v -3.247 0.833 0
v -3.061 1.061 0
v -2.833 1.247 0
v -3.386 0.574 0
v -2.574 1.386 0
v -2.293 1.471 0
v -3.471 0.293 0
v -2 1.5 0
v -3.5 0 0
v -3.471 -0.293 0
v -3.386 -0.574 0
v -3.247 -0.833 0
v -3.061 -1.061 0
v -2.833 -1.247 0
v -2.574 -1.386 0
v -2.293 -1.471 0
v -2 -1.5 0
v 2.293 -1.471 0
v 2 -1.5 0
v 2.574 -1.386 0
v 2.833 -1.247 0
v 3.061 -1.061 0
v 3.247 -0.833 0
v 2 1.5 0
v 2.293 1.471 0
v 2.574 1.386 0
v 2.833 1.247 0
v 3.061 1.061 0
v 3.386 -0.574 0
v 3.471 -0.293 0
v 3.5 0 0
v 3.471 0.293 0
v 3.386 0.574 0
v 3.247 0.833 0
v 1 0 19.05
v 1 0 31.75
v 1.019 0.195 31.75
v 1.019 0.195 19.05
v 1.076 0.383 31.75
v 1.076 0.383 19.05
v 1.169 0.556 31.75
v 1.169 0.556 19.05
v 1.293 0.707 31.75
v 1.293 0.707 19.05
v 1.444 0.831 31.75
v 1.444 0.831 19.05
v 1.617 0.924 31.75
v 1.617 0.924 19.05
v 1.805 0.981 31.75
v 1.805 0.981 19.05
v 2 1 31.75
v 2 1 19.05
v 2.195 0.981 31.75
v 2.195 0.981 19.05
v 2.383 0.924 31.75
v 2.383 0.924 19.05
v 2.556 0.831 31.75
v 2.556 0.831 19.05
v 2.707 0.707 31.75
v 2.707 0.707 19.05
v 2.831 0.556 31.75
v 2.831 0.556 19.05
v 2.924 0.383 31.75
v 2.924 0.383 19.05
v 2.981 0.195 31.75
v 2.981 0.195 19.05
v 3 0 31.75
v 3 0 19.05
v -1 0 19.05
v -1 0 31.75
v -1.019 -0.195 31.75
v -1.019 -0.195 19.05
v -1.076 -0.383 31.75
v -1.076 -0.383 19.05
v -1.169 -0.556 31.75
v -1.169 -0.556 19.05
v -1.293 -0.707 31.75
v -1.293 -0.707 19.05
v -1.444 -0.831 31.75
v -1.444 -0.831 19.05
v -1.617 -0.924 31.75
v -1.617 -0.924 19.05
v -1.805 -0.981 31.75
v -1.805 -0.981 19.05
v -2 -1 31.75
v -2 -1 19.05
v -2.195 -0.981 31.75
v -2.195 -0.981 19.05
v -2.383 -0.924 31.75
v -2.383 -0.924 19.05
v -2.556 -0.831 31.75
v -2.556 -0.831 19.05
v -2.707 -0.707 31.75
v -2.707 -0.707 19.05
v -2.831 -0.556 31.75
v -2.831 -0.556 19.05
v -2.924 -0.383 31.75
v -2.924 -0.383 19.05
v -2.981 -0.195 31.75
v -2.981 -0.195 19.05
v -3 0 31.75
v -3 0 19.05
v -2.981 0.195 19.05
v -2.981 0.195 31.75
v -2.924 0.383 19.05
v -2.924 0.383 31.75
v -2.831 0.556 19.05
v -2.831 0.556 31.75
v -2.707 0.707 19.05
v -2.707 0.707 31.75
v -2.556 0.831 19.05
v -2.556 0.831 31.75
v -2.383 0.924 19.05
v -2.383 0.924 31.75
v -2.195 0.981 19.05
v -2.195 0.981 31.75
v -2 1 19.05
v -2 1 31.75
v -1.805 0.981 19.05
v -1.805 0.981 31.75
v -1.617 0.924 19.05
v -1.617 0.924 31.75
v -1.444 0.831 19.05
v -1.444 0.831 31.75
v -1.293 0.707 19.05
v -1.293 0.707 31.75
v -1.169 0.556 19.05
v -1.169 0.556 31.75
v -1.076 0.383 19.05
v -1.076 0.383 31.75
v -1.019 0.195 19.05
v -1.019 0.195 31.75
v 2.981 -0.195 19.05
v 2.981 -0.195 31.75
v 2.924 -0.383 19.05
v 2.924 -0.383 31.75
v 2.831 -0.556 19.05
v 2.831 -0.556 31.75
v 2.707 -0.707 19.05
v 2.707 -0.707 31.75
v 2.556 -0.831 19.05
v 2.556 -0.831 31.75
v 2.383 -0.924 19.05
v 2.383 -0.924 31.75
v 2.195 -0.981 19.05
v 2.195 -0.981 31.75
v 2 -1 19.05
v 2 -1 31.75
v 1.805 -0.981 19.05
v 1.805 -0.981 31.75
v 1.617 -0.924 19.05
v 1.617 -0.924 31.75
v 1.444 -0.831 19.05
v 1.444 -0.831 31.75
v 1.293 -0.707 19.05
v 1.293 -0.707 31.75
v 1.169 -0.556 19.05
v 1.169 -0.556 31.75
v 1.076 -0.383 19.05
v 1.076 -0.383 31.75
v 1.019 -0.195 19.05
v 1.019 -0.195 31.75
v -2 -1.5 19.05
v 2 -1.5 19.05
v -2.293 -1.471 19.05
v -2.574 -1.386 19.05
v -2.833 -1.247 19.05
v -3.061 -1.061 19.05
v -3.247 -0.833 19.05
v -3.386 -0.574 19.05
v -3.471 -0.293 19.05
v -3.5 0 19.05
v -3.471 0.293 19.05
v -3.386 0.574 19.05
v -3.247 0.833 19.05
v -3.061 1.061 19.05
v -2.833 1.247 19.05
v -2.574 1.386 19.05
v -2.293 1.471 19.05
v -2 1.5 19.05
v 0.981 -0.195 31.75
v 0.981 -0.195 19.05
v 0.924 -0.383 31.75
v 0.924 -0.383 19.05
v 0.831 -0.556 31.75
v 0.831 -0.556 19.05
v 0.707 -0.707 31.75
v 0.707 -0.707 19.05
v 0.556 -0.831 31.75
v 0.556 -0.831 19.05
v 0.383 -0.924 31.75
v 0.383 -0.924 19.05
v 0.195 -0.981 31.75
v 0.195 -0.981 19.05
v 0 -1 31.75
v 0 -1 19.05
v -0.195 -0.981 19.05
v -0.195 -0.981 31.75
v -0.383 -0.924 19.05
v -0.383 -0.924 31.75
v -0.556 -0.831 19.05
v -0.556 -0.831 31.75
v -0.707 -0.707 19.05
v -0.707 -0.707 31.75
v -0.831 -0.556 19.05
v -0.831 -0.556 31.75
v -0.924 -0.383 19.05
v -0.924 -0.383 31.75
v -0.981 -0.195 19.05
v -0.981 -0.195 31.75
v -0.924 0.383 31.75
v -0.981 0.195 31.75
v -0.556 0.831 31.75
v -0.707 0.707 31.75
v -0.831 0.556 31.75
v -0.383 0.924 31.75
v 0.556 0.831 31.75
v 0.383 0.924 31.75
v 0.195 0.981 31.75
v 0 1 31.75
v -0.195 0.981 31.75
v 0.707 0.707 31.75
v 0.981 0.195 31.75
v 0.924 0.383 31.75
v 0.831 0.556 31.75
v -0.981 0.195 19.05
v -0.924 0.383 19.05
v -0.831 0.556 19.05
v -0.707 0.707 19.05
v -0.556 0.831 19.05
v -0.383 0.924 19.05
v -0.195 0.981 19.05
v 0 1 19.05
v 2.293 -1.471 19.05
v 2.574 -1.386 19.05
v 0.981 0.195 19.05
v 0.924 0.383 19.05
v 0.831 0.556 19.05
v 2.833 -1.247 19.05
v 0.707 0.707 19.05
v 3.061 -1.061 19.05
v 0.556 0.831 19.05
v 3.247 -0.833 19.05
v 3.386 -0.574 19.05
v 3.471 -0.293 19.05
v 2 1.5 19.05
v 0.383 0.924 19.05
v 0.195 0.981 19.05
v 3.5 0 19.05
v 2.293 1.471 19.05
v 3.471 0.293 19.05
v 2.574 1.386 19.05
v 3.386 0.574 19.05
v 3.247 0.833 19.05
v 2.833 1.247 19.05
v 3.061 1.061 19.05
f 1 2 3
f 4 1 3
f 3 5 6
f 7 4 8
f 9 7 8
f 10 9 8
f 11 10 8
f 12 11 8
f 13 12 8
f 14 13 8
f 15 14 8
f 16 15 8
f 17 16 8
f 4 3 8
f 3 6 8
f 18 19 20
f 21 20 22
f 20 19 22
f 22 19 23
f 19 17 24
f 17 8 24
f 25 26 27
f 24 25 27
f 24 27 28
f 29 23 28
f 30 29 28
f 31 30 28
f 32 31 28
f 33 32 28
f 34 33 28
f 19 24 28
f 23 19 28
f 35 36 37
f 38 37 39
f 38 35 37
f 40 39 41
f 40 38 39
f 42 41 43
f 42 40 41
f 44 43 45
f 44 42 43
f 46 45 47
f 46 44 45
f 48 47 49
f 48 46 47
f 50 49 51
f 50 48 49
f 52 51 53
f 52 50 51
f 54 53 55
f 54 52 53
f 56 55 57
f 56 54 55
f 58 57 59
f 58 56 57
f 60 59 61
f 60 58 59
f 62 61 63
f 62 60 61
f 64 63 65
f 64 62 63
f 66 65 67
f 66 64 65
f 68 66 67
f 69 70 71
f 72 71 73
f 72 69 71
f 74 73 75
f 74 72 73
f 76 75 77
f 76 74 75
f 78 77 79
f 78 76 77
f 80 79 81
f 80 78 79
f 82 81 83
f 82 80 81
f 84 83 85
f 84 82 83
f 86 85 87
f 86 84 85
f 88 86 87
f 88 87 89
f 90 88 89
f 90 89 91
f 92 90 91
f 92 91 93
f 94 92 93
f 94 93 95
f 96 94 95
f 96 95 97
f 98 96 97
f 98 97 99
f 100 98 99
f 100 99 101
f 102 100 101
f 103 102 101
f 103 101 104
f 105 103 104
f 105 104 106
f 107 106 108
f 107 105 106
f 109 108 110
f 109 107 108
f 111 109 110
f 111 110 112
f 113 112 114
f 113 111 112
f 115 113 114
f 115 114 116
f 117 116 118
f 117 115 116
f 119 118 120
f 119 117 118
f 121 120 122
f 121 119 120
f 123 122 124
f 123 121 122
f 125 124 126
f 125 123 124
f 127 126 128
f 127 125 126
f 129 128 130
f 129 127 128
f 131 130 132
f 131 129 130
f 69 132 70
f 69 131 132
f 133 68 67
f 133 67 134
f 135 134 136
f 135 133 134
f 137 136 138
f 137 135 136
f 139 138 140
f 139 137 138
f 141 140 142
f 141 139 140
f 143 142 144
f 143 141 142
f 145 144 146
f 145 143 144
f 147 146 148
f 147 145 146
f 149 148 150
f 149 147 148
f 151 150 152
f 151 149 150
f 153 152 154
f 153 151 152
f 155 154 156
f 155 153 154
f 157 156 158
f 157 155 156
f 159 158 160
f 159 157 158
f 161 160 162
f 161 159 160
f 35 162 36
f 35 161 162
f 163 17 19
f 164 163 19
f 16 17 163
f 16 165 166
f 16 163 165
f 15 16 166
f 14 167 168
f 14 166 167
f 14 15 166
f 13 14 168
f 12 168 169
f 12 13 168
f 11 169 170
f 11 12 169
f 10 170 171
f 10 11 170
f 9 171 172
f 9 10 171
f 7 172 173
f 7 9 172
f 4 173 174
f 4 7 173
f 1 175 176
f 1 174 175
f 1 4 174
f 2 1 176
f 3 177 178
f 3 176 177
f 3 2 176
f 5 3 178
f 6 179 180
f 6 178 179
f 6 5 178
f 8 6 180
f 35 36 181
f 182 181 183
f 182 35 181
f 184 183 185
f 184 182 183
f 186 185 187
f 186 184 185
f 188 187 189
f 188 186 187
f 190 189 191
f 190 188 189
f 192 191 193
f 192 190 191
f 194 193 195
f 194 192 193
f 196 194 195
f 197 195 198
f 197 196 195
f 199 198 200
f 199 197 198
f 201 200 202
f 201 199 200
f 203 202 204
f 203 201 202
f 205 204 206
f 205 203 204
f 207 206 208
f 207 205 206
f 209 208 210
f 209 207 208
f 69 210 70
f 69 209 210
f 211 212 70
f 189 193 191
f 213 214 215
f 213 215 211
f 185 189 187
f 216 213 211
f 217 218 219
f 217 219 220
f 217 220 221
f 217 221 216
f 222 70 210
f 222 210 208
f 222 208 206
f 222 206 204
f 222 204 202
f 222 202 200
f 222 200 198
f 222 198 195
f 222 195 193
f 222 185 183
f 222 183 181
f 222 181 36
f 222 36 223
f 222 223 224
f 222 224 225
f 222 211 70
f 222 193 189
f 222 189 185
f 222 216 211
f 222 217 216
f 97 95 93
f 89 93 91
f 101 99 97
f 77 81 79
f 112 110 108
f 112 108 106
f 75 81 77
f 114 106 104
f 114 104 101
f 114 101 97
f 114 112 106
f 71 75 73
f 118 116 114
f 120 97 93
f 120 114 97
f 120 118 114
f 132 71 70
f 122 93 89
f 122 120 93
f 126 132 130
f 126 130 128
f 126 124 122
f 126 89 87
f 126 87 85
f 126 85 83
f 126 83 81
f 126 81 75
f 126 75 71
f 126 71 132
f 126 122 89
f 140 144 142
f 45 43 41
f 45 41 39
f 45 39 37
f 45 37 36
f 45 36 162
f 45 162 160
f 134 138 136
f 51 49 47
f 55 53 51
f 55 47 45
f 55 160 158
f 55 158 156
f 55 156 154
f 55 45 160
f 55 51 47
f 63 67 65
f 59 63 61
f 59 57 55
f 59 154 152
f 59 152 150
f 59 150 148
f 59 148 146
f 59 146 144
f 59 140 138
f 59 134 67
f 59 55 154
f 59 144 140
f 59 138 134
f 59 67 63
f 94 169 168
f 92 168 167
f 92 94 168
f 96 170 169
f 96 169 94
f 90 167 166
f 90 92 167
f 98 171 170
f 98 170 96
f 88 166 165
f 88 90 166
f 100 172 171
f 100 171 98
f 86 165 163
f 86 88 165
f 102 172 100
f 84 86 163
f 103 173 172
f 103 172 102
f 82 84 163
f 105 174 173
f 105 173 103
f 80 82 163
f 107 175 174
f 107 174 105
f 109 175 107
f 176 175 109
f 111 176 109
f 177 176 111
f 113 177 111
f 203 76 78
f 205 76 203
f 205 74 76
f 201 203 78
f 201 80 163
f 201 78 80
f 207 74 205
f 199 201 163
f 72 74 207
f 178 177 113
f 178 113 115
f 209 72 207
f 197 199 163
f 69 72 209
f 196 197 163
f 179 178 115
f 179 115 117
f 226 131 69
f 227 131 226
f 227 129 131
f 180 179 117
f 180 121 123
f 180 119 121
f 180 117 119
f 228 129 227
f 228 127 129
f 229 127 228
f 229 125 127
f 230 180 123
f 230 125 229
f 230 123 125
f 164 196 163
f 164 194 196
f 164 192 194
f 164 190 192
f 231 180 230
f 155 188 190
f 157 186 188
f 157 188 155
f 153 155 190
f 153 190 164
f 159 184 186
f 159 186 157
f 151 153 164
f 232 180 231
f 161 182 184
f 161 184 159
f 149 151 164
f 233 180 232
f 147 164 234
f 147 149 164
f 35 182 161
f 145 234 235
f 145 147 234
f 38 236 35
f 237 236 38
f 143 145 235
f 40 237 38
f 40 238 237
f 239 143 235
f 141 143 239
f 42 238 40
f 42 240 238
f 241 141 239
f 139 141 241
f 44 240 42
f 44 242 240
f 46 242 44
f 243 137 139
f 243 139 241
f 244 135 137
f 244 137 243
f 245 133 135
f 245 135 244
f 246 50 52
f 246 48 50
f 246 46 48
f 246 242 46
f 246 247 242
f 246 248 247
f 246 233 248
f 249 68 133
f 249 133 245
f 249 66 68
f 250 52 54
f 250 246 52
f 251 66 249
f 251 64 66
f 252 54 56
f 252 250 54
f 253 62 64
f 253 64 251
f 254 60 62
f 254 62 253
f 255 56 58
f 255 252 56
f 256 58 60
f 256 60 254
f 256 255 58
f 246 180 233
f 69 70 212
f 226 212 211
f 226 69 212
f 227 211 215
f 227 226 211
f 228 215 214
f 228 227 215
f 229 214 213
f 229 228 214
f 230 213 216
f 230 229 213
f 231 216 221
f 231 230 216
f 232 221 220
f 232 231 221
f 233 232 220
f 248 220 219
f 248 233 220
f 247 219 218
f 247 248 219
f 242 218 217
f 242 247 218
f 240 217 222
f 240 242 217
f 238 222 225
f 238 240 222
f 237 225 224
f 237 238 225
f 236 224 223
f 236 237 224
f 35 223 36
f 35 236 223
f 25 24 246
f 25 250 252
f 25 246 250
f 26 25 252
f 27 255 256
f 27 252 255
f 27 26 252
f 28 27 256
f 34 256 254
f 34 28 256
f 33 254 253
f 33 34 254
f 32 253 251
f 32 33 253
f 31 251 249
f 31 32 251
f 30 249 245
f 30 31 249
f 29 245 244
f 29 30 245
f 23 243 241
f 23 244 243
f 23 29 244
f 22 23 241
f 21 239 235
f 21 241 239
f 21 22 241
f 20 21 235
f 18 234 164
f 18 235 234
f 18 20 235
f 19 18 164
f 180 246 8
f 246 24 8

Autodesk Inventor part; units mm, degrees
ref_plane "YZ Plane" through (0, 0, 0) normal (1, 0, 0) x (0, 1, 0)
ref_plane "XZ Plane" through (0, 0, 0) normal (0, 1, 0) x (-1, 0, 0)
ref_plane "XY Plane" through (0, 0, 0) normal (0, 0, 1) x (1, 0, 0)
sketch "Sketch1" plane through (0, 0, 0) normal (0, 0, 1) x (1, 0, 0)
  line L0 (-2, 0) -> (2, 0) construction
  line L1 (-2, -1.5) -> (2, -1.5)
  line L2 (2, 1.5) -> (-2, 1.5)
  arc A0 (-2, 1.5) -> (-2, -1.5) centre (-2, 0) ccw
  arc A1 (2, -1.5) -> (2, 1.5) centre (2, 0) ccw
  point P0 (0, 0)
  dimension "d0" = 4
  dimension "d1" = 1.5
extrude "Extrusion1" add sketch "Sketch1" along normal blind 19.05
sketch "Sketch2" plane through (0, 0, 19.05) normal (0, 0, 1) x (1, 0, 0)
  circle A0 centre (0, 0) radius 1
  circle A1 centre (-2, 0) radius 1
  circle A2 centre (2, 0) radius 1
  line L0 (-2, 0) -> (2, 0)
  point P0 (-1, 0)
  point P1 (1, 0)
  dimension "d4" = 2
  dimension "d5" = 2
  dimension "d6" = 2
extrude "Extrusion2" add sketch "Sketch2" along normal blind 12.7
properties part number "CABLE"
